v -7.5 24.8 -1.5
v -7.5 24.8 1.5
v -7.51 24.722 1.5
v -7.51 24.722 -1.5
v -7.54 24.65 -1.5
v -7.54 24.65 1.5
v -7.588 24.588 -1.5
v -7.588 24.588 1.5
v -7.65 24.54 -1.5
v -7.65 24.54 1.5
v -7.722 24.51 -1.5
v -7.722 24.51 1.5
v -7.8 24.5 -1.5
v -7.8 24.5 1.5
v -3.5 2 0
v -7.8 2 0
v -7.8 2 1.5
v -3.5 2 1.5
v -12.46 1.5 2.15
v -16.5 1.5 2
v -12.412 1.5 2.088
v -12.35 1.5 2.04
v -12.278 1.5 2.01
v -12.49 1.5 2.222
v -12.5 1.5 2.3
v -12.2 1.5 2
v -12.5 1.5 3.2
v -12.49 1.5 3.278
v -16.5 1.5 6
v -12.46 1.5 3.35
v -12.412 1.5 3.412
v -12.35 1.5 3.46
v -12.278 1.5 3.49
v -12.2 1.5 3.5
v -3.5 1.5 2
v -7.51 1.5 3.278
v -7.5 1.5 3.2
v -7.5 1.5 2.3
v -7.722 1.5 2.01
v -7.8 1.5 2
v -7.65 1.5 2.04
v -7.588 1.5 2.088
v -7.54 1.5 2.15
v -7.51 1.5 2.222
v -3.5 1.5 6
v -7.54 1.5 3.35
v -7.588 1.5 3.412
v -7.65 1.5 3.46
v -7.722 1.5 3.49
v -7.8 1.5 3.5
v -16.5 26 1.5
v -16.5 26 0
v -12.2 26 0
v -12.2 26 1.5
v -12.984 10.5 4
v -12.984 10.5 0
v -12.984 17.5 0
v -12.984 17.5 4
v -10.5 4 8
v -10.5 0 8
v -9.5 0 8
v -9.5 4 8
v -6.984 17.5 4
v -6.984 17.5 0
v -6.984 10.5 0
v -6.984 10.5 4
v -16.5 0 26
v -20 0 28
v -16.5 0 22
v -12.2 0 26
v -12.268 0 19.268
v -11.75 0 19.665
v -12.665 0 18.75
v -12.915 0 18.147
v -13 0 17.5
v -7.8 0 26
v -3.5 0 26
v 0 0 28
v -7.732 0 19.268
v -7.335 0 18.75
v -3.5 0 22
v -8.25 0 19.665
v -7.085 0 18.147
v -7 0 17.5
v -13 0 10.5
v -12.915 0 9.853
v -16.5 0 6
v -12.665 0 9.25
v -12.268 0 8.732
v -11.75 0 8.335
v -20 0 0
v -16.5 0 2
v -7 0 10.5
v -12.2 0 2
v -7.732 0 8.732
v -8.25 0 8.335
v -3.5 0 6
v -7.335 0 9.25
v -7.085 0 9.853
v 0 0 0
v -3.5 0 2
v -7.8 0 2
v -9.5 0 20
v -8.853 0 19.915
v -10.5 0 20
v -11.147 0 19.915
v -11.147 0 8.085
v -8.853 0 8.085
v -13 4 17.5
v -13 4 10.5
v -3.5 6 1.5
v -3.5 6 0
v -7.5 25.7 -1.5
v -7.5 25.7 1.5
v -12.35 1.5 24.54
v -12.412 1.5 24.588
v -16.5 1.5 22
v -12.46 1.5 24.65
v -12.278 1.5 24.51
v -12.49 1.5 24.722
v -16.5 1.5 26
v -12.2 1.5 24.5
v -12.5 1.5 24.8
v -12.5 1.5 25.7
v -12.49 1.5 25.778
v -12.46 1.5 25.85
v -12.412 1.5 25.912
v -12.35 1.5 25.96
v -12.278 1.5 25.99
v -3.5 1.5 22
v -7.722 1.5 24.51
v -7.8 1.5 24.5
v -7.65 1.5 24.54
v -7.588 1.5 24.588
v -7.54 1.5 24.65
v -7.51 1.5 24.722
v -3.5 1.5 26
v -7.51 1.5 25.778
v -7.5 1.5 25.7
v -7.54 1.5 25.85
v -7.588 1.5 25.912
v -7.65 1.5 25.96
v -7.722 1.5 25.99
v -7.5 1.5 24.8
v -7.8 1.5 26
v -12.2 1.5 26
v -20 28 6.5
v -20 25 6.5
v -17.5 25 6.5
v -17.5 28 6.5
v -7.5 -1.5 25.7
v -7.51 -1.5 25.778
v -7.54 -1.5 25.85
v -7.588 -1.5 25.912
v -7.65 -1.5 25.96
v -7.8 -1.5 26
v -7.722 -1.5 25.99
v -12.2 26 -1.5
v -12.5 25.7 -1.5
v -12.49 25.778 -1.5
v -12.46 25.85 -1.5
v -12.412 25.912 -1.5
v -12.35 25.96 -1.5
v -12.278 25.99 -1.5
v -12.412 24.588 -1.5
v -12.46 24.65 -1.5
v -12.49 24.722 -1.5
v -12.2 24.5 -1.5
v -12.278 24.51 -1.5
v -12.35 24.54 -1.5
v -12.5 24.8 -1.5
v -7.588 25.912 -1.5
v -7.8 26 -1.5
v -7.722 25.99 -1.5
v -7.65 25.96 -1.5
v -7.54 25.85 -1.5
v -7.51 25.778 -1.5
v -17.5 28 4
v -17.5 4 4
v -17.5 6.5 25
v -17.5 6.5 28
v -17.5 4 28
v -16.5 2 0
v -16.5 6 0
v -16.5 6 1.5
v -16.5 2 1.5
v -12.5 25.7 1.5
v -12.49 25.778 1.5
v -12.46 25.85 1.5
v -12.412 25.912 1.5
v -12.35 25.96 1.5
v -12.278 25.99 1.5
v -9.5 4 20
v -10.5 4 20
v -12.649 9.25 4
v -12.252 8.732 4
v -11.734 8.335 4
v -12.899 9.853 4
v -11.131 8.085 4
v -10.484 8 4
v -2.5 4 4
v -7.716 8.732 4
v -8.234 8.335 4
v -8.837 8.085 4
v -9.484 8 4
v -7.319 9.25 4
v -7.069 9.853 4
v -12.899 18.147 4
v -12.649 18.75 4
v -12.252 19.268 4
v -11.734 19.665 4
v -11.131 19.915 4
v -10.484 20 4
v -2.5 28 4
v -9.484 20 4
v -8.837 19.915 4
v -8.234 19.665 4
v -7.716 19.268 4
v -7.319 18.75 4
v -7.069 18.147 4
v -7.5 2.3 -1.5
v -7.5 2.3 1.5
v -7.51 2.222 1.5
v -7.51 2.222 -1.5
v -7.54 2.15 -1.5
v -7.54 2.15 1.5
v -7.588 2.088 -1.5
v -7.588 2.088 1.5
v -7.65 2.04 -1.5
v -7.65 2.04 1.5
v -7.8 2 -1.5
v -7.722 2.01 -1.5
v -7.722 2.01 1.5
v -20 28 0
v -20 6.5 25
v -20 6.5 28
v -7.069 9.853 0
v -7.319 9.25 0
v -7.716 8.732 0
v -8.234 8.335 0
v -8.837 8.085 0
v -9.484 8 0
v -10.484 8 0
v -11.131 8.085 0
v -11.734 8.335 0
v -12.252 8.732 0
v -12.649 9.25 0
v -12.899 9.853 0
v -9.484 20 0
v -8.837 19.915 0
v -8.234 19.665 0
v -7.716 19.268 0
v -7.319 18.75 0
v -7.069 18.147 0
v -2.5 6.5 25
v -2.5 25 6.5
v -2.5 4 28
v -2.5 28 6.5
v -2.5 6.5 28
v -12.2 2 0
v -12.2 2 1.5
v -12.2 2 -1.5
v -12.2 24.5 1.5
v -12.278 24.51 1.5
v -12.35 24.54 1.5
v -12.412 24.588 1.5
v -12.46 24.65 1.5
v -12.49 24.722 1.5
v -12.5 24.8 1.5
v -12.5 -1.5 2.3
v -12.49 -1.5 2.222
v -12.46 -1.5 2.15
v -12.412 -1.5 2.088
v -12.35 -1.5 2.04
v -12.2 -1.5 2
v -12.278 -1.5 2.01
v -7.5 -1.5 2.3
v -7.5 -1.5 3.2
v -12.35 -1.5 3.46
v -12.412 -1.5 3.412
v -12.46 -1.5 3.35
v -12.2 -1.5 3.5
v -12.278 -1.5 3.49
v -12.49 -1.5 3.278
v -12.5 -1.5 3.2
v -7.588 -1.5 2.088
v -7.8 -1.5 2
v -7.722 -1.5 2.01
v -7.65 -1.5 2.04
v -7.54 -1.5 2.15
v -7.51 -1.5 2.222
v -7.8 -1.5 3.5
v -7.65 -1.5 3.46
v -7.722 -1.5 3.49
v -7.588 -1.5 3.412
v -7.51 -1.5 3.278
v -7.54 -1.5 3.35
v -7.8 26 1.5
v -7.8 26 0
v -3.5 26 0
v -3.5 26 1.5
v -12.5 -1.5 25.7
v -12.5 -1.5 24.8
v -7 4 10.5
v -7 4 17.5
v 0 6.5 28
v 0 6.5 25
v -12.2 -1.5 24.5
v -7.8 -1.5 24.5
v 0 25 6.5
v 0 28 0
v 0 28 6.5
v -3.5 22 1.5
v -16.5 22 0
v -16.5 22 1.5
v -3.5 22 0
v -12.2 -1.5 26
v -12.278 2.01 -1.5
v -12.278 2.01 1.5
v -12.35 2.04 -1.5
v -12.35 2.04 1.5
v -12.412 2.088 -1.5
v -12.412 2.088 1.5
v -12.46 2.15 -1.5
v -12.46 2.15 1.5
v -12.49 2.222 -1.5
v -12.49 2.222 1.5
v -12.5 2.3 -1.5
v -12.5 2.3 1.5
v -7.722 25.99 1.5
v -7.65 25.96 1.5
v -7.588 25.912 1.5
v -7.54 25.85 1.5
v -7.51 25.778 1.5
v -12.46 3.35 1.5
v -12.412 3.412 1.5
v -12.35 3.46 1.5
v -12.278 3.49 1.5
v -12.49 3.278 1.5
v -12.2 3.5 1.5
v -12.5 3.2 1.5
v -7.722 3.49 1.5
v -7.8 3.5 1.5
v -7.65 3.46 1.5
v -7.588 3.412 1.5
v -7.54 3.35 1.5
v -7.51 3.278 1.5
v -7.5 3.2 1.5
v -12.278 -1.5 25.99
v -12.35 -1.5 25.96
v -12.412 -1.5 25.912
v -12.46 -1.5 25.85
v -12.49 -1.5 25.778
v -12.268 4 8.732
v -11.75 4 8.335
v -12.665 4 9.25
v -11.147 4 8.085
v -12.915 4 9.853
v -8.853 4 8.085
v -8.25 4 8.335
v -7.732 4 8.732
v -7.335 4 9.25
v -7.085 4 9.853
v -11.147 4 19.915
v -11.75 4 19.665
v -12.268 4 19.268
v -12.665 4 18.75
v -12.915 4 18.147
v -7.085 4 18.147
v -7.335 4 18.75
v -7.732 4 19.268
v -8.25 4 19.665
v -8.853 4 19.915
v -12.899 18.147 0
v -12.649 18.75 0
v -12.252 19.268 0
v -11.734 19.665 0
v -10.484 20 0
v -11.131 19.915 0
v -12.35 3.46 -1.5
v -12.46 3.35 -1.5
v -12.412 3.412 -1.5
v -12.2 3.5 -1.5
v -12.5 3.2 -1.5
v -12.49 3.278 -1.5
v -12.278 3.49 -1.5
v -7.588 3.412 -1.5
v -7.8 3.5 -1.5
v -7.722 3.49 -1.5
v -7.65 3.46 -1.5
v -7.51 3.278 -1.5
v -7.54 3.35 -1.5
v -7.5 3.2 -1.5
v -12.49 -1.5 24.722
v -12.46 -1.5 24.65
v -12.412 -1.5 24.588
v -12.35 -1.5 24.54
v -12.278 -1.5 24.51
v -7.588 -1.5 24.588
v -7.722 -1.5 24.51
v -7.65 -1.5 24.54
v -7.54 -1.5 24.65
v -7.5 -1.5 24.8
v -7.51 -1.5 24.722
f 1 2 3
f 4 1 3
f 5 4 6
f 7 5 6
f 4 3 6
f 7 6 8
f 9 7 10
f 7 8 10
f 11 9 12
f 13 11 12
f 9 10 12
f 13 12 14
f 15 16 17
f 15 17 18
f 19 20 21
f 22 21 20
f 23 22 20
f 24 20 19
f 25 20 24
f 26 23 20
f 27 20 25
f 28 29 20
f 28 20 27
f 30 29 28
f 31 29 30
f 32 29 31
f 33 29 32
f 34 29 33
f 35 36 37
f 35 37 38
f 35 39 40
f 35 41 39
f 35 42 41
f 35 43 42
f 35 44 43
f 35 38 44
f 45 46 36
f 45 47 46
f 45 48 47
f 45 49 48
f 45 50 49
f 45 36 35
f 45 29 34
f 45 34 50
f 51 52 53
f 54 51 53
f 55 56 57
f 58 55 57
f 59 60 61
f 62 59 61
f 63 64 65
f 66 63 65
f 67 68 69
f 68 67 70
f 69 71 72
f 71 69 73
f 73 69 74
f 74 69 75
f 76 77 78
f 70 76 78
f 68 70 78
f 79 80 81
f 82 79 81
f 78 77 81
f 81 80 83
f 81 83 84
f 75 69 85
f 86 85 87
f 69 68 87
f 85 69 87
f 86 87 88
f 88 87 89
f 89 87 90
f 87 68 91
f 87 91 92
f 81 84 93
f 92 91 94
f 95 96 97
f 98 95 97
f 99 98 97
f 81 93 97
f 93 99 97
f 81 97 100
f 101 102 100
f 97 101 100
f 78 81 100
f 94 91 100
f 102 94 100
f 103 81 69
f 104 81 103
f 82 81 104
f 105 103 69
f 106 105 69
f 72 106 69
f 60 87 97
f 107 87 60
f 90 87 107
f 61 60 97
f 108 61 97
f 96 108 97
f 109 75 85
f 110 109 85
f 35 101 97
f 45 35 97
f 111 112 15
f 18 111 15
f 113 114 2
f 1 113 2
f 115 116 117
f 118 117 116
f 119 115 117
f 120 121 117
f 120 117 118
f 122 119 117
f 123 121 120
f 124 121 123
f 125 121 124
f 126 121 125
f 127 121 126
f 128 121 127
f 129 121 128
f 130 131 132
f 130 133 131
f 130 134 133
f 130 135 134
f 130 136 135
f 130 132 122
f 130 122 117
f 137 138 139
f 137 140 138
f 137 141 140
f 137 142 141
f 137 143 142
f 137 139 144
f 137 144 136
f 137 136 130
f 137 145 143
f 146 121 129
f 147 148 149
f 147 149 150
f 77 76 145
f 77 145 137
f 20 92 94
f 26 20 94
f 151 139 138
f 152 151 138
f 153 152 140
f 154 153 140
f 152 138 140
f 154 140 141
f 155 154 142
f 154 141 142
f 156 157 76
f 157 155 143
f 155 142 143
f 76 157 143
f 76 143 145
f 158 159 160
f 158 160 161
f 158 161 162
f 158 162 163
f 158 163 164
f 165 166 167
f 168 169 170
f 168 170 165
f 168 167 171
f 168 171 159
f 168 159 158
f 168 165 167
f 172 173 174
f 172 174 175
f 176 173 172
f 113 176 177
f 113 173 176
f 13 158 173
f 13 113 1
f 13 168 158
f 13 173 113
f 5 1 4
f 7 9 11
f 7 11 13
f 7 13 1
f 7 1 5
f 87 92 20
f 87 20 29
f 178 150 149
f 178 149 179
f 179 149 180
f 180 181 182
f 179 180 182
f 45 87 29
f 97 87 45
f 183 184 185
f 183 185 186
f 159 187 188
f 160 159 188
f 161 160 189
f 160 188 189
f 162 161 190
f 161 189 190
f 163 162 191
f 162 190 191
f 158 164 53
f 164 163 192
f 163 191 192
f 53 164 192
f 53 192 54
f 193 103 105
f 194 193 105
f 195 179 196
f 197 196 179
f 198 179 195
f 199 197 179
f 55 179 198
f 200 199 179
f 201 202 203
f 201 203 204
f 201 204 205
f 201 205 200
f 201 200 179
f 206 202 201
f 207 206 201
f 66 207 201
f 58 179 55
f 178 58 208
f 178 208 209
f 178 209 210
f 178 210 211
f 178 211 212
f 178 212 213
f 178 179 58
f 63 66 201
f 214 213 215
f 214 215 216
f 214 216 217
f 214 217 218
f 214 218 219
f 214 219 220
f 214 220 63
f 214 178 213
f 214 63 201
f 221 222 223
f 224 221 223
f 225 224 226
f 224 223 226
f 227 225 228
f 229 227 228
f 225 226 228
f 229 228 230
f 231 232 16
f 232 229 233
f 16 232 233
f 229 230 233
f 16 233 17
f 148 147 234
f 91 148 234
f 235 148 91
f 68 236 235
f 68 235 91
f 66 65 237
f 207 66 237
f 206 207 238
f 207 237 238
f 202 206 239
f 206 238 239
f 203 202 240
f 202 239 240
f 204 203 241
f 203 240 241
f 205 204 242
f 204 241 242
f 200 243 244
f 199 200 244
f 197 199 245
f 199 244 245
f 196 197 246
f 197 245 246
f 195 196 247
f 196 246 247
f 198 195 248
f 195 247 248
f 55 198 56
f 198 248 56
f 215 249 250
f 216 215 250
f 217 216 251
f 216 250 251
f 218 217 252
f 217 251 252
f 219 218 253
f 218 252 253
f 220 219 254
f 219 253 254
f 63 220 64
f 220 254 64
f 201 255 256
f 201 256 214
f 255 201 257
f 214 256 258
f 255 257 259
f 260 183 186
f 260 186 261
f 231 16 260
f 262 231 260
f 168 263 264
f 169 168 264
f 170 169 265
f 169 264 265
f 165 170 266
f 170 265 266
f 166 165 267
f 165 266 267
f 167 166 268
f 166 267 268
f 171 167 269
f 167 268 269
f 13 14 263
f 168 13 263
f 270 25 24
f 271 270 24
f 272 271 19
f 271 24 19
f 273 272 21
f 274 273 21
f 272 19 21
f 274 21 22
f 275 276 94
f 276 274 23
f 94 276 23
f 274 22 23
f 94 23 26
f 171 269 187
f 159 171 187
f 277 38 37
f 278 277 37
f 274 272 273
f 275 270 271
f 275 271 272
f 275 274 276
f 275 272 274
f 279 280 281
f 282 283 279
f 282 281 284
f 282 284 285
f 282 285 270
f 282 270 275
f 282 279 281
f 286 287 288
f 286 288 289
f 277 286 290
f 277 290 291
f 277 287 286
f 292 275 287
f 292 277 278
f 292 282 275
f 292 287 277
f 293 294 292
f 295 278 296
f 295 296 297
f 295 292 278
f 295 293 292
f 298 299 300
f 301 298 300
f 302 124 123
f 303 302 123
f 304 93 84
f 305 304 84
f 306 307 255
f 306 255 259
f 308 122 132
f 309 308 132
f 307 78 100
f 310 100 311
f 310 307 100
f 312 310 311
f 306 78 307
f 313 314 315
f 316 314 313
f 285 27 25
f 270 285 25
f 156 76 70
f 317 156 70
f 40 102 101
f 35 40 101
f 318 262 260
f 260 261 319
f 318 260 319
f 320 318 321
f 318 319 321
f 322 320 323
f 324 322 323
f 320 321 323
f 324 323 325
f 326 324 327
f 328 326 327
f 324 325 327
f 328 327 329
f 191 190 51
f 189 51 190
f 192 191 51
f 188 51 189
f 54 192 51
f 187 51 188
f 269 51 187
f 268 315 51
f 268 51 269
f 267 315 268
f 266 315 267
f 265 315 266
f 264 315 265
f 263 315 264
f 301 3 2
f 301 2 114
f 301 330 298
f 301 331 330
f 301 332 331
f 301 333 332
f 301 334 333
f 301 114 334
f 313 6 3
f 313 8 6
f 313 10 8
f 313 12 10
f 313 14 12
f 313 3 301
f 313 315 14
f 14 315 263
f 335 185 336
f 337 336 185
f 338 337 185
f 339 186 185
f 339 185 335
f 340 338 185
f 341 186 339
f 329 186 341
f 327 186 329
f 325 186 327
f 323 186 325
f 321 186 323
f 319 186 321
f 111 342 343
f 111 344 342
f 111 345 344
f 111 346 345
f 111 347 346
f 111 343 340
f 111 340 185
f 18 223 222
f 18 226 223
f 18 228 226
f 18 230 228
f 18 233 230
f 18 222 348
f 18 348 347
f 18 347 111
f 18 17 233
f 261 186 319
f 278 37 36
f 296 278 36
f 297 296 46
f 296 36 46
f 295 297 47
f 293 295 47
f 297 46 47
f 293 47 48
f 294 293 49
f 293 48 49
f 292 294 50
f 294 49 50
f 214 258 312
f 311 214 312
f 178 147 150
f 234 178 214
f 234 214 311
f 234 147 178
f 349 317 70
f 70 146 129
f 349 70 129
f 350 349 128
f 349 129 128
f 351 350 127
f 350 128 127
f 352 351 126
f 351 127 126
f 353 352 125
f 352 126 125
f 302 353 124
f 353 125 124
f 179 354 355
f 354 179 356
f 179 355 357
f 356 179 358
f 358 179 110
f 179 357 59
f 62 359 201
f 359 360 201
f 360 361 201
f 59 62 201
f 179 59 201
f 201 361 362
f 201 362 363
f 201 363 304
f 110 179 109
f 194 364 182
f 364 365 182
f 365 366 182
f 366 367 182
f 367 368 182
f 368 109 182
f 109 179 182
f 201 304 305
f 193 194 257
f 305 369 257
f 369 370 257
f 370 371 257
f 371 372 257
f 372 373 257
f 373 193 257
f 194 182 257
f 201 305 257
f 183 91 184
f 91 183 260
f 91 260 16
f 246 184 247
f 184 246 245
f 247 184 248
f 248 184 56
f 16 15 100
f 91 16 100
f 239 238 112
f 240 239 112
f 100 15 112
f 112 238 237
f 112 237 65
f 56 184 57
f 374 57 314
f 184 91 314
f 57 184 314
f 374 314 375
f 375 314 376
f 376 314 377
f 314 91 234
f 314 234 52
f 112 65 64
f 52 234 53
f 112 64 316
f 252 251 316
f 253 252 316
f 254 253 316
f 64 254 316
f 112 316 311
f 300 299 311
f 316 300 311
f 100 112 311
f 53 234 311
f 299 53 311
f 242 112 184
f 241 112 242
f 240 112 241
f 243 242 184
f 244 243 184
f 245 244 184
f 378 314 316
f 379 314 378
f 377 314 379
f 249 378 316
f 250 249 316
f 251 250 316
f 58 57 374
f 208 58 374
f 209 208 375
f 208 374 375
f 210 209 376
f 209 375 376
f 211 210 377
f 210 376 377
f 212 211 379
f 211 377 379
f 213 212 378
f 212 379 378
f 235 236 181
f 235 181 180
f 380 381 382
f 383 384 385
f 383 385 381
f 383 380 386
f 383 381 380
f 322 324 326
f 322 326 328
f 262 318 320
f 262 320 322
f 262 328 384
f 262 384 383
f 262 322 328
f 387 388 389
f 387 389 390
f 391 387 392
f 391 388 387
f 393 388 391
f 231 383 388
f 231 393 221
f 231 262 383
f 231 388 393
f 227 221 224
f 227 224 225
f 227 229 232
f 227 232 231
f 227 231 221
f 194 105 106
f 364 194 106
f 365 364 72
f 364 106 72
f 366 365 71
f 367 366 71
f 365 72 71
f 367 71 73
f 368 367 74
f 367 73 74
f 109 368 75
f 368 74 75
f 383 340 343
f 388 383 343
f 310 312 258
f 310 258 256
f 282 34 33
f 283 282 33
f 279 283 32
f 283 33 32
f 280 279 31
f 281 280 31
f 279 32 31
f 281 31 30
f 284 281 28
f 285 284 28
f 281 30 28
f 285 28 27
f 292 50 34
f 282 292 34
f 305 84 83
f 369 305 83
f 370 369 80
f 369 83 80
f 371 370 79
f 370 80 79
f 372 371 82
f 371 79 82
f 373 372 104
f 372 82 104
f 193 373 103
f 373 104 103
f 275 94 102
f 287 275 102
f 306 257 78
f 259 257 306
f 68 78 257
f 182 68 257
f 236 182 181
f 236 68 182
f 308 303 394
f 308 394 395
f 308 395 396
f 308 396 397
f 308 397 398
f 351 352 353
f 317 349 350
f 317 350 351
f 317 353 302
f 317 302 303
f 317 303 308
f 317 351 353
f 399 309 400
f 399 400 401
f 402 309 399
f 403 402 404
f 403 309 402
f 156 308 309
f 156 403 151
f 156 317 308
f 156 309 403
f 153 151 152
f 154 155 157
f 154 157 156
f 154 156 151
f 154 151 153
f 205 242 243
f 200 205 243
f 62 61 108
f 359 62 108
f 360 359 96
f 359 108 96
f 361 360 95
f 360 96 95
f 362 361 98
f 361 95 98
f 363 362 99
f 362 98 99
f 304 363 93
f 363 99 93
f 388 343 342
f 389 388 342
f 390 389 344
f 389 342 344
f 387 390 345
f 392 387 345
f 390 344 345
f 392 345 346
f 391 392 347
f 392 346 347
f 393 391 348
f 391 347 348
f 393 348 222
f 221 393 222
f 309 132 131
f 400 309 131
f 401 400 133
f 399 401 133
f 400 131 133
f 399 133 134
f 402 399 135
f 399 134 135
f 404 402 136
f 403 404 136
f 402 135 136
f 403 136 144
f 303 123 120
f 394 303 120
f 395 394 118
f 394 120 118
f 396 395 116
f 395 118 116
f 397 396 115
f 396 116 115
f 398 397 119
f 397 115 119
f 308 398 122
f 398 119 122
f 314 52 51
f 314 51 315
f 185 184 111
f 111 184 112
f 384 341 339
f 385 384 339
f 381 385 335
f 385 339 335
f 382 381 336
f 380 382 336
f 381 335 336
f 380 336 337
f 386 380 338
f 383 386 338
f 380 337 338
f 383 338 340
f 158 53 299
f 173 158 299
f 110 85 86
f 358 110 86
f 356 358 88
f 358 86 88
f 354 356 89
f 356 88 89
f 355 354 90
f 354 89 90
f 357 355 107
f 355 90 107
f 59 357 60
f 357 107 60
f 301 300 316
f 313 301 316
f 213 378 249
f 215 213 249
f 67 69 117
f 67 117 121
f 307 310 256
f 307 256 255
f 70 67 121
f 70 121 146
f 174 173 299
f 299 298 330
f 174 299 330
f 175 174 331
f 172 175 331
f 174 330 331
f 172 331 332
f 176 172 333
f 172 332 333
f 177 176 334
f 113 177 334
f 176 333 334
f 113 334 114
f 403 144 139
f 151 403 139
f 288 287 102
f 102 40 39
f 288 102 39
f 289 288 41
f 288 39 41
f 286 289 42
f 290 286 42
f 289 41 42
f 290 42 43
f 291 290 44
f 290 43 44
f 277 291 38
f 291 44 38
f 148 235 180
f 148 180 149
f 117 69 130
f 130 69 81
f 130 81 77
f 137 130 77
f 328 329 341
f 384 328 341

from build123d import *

# Parameters (mm, degrees)
F0_W      = 20
F0_H      = 28
F1_DEPTH  = 4
F2_W      = 20
F2_H      = 28
F3_DEPTH  = 4
F4_W      = 13
F4_H      = 4
F5_DEPTH  = 1.5
F7_DEPTH  = 3
F9_DEPTH  = 3
F11_DEPTH = 4
F12_W     = 13
F12_H     = 4
F13_DEPTH = 1.5
F15_DEPTH = 4
F17_DEPTH = 3
F19_DEPTH = 3
F21_DEPTH = 2.5
F23_DEPTH = 2.5


with BuildPart() as f1:
    # F0 (on Top) → F1 (new body)
    with BuildSketch(Plane.XY):
        with Locations((-10, 14)):
            Rectangle(F0_W, F0_H)
    extrude(amount=F1_DEPTH)

    # F2 (on Front) → F3 (join)
    with BuildSketch(Plane.XZ):
        with Locations((-10, 14)):
            Rectangle(F2_W, F2_H)
    extrude(amount=-F3_DEPTH)

    # F4 (on face) → F5 (cut)
    with BuildSketch(Plane.XZ):
        with Locations((-10, 4)):
            Rectangle(F4_W, F4_H)
        with Locations((-10, 24)):
            Rectangle(F4_W, F4_H)
    extrude(amount=-F5_DEPTH, mode=Mode.SUBTRACT)

    # F6 (on face) → F7 (join)
    with BuildSketch(Plane.XZ.offset(-1.5)):
        with BuildLine():
            Line((-7.8, 3.5), (-12.2, 3.5))
            ThreePointArc((-12.2, 3.5), (-12.4121320344, 3.4121320344), (-12.5, 3.2))
            Line((-12.5, 3.2), (-12.5, 2.3))
            ThreePointArc((-12.5, 2.3), (-12.4121320344, 2.0878679656), (-12.2, 2))
            Line((-12.2, 2), (-7.8, 2))
            ThreePointArc((-7.8, 2), (-7.5878679656, 2.0878679656), (-7.5, 2.3))
            Line((-7.5, 2.3), (-7.5, 3.2))
            ThreePointArc((-7.5, 3.2), (-7.5878679656, 3.4121320344), (-7.8, 3.5))
        make_face()
    extrude(amount=F7_DEPTH)

    # F8 (on face) → F9 (join)
    with BuildSketch(Plane.XZ.offset(-1.5)):
        with BuildLine():
            Line((-7.8, 26), (-12.2, 26))
            ThreePointArc((-12.2, 26), (-12.4121320344, 25.9121320344), (-12.5, 25.7))
            Line((-12.5, 25.7), (-12.5, 24.8))
            ThreePointArc((-12.5, 24.8), (-12.4121320344, 24.5878679656), (-12.2, 24.5))
            Line((-12.2, 24.5), (-7.8, 24.5))
            ThreePointArc((-7.8, 24.5), (-7.5878679656, 24.5878679656), (-7.5, 24.8))
            Line((-7.5, 24.8), (-7.5, 25.7))
            ThreePointArc((-7.5, 25.7), (-7.5878679656, 25.9121320344), (-7.8, 26))
        make_face()
    extrude(amount=F9_DEPTH)

    # F10 (on face) → F11 (cut)
    with BuildSketch(Plane.XZ):
        with BuildLine():
            Line((-7, 10.5), (-7, 14))
            Line((-7, 14), (-13, 14))
            Line((-13, 14), (-13, 10.5))
            ThreePointArc((-13, 10.5), (-12.267766953, 8.732233047), (-10.5, 8))
            Line((-10.5, 8), (-9.5, 8))
            ThreePointArc((-9.5, 8), (-7.732233047, 8.732233047), (-7, 10.5))
        make_face()
        with BuildLine():
            Line((-13, 14), (-7, 14))
            Line((-7, 14), (-7, 17.5))
            ThreePointArc((-7, 17.5), (-7.732233047, 19.267766953), (-9.5, 20))
            Line((-9.5, 20), (-10.5, 20))
            ThreePointArc((-10.5, 20), (-12.267766953, 19.267766953), (-13, 17.5))
            Line((-13, 17.5), (-13, 14))
        make_face()
    extrude(amount=-F11_DEPTH, mode=Mode.SUBTRACT)

    # F12 (on face) → F13 (cut)
    with BuildSketch(Plane(origin=(0, 0, 0), x_dir=(1, 0, 0), z_dir=(0, 0, -1))):
        with Locations((-10, -24)):
            Rectangle(F12_W, F12_H)
        with Locations((-10, -4)):
            Rectangle(F12_W, F12_H)
    extrude(amount=-F13_DEPTH, mode=Mode.SUBTRACT)

    # F14 (on face) → F15 (cut)
    with BuildSketch(Plane(origin=(0, 0, 0), x_dir=(1, 0, 0), z_dir=(0, 0, -1))):
        with BuildLine():
            Line((-6.9838613272, -14), (-12.9838613272, -14))
            Line((-12.9838613272, -14), (-12.9838613272, -17.5))
            ThreePointArc((-12.9838613272, -17.5), (-12.2516282801, -19.267766953), (-10.4838613272, -20))
            Line((-10.4838613272, -20), (-9.4838613272, -20))
            ThreePointArc((-9.4838613272, -20), (-7.7160943742, -19.267766953), (-6.9838613272, -17.5))
            Line((-6.9838613272, -17.5), (-6.9838613272, -14))
        make_face()
        with BuildLine():
            Line((-9.4838613272, -8), (-10.4838613272, -8))
            ThreePointArc((-10.4838613272, -8), (-12.2516282801, -8.732233047), (-12.9838613272, -10.5))
            Line((-12.9838613272, -10.5), (-12.9838613272, -14))
            Line((-12.9838613272, -14), (-6.9838613272, -14))
            Line((-6.9838613272, -14), (-6.9838613272, -10.5))
            ThreePointArc((-6.9838613272, -10.5), (-7.7160943742, -8.732233047), (-9.4838613272, -8))
        make_face()
    extrude(amount=-F15_DEPTH, mode=Mode.SUBTRACT)

    # F16 (on face) → F17 (join)
    with BuildSketch(Plane(origin=(0, 0, 1.5), x_dir=(1, 0, 0), z_dir=(0, 0, -1))):
        with BuildLine():
            Line((-7.8, -24.5), (-12.2, -24.5))
            ThreePointArc((-12.2, -24.5), (-12.4121320344, -24.5878679656), (-12.5, -24.8))
            Line((-12.5, -24.8), (-12.5, -25.7))
            ThreePointArc((-12.5, -25.7), (-12.4121320344, -25.9121320344), (-12.2, -26))
            Line((-12.2, -26), (-7.8, -26))
            ThreePointArc((-7.8, -26), (-7.5878679656, -25.9121320344), (-7.5, -25.7))
            Line((-7.5, -25.7), (-7.5, -24.8))
            ThreePointArc((-7.5, -24.8), (-7.5878679656, -24.5878679656), (-7.8, -24.5))
        make_face()
    extrude(amount=F17_DEPTH)

    # F18 (on face) → F19 (join)
    with BuildSketch(Plane(origin=(0, 0, 1.5), x_dir=(1, 0, 0), z_dir=(0, 0, -1))):
        with BuildLine():
            Line((-12.2, -3.5), (-7.8, -3.5))
            ThreePointArc((-7.8, -3.5), (-7.5878679656, -3.4121320344), (-7.5, -3.2))
            Line((-7.5, -3.2), (-7.5, -2.3))
            ThreePointArc((-7.5, -2.3), (-7.5878679656, -2.0878679656), (-7.8, -2))
            Line((-7.8, -2), (-12.2, -2))
            ThreePointArc((-12.2, -2), (-12.4121320344, -2.0878679656), (-12.5, -2.3))
            Line((-12.5, -2.3), (-12.5, -3.2))
            ThreePointArc((-12.5, -3.2), (-12.4121320344, -3.4121320344), (-12.2, -3.5))
        make_face()
    extrude(amount=F19_DEPTH)

    # F20 (on face) → F21 (join)
    with BuildSketch(Plane.YZ):
        Polygon((4, 4), (28, 4), (28, 6.5), (25, 6.5), (6.5, 25), (6.5, 28), (4, 28), align=None)
    extrude(amount=-F21_DEPTH)

    # F22 (on face) → F23 (join)
    with BuildSketch(Plane(origin=(-20, 0, 0), x_dir=(0, -1, 0), z_dir=(-1, 0, 0))):
        Polygon((-4, 4), (-4, 28), (-6.5, 28), (-6.5, 25), (-25, 6.5), (-28, 6.5), (-28, 4), align=None)
    extrude(amount=-F23_DEPTH)


solid = f1.part
